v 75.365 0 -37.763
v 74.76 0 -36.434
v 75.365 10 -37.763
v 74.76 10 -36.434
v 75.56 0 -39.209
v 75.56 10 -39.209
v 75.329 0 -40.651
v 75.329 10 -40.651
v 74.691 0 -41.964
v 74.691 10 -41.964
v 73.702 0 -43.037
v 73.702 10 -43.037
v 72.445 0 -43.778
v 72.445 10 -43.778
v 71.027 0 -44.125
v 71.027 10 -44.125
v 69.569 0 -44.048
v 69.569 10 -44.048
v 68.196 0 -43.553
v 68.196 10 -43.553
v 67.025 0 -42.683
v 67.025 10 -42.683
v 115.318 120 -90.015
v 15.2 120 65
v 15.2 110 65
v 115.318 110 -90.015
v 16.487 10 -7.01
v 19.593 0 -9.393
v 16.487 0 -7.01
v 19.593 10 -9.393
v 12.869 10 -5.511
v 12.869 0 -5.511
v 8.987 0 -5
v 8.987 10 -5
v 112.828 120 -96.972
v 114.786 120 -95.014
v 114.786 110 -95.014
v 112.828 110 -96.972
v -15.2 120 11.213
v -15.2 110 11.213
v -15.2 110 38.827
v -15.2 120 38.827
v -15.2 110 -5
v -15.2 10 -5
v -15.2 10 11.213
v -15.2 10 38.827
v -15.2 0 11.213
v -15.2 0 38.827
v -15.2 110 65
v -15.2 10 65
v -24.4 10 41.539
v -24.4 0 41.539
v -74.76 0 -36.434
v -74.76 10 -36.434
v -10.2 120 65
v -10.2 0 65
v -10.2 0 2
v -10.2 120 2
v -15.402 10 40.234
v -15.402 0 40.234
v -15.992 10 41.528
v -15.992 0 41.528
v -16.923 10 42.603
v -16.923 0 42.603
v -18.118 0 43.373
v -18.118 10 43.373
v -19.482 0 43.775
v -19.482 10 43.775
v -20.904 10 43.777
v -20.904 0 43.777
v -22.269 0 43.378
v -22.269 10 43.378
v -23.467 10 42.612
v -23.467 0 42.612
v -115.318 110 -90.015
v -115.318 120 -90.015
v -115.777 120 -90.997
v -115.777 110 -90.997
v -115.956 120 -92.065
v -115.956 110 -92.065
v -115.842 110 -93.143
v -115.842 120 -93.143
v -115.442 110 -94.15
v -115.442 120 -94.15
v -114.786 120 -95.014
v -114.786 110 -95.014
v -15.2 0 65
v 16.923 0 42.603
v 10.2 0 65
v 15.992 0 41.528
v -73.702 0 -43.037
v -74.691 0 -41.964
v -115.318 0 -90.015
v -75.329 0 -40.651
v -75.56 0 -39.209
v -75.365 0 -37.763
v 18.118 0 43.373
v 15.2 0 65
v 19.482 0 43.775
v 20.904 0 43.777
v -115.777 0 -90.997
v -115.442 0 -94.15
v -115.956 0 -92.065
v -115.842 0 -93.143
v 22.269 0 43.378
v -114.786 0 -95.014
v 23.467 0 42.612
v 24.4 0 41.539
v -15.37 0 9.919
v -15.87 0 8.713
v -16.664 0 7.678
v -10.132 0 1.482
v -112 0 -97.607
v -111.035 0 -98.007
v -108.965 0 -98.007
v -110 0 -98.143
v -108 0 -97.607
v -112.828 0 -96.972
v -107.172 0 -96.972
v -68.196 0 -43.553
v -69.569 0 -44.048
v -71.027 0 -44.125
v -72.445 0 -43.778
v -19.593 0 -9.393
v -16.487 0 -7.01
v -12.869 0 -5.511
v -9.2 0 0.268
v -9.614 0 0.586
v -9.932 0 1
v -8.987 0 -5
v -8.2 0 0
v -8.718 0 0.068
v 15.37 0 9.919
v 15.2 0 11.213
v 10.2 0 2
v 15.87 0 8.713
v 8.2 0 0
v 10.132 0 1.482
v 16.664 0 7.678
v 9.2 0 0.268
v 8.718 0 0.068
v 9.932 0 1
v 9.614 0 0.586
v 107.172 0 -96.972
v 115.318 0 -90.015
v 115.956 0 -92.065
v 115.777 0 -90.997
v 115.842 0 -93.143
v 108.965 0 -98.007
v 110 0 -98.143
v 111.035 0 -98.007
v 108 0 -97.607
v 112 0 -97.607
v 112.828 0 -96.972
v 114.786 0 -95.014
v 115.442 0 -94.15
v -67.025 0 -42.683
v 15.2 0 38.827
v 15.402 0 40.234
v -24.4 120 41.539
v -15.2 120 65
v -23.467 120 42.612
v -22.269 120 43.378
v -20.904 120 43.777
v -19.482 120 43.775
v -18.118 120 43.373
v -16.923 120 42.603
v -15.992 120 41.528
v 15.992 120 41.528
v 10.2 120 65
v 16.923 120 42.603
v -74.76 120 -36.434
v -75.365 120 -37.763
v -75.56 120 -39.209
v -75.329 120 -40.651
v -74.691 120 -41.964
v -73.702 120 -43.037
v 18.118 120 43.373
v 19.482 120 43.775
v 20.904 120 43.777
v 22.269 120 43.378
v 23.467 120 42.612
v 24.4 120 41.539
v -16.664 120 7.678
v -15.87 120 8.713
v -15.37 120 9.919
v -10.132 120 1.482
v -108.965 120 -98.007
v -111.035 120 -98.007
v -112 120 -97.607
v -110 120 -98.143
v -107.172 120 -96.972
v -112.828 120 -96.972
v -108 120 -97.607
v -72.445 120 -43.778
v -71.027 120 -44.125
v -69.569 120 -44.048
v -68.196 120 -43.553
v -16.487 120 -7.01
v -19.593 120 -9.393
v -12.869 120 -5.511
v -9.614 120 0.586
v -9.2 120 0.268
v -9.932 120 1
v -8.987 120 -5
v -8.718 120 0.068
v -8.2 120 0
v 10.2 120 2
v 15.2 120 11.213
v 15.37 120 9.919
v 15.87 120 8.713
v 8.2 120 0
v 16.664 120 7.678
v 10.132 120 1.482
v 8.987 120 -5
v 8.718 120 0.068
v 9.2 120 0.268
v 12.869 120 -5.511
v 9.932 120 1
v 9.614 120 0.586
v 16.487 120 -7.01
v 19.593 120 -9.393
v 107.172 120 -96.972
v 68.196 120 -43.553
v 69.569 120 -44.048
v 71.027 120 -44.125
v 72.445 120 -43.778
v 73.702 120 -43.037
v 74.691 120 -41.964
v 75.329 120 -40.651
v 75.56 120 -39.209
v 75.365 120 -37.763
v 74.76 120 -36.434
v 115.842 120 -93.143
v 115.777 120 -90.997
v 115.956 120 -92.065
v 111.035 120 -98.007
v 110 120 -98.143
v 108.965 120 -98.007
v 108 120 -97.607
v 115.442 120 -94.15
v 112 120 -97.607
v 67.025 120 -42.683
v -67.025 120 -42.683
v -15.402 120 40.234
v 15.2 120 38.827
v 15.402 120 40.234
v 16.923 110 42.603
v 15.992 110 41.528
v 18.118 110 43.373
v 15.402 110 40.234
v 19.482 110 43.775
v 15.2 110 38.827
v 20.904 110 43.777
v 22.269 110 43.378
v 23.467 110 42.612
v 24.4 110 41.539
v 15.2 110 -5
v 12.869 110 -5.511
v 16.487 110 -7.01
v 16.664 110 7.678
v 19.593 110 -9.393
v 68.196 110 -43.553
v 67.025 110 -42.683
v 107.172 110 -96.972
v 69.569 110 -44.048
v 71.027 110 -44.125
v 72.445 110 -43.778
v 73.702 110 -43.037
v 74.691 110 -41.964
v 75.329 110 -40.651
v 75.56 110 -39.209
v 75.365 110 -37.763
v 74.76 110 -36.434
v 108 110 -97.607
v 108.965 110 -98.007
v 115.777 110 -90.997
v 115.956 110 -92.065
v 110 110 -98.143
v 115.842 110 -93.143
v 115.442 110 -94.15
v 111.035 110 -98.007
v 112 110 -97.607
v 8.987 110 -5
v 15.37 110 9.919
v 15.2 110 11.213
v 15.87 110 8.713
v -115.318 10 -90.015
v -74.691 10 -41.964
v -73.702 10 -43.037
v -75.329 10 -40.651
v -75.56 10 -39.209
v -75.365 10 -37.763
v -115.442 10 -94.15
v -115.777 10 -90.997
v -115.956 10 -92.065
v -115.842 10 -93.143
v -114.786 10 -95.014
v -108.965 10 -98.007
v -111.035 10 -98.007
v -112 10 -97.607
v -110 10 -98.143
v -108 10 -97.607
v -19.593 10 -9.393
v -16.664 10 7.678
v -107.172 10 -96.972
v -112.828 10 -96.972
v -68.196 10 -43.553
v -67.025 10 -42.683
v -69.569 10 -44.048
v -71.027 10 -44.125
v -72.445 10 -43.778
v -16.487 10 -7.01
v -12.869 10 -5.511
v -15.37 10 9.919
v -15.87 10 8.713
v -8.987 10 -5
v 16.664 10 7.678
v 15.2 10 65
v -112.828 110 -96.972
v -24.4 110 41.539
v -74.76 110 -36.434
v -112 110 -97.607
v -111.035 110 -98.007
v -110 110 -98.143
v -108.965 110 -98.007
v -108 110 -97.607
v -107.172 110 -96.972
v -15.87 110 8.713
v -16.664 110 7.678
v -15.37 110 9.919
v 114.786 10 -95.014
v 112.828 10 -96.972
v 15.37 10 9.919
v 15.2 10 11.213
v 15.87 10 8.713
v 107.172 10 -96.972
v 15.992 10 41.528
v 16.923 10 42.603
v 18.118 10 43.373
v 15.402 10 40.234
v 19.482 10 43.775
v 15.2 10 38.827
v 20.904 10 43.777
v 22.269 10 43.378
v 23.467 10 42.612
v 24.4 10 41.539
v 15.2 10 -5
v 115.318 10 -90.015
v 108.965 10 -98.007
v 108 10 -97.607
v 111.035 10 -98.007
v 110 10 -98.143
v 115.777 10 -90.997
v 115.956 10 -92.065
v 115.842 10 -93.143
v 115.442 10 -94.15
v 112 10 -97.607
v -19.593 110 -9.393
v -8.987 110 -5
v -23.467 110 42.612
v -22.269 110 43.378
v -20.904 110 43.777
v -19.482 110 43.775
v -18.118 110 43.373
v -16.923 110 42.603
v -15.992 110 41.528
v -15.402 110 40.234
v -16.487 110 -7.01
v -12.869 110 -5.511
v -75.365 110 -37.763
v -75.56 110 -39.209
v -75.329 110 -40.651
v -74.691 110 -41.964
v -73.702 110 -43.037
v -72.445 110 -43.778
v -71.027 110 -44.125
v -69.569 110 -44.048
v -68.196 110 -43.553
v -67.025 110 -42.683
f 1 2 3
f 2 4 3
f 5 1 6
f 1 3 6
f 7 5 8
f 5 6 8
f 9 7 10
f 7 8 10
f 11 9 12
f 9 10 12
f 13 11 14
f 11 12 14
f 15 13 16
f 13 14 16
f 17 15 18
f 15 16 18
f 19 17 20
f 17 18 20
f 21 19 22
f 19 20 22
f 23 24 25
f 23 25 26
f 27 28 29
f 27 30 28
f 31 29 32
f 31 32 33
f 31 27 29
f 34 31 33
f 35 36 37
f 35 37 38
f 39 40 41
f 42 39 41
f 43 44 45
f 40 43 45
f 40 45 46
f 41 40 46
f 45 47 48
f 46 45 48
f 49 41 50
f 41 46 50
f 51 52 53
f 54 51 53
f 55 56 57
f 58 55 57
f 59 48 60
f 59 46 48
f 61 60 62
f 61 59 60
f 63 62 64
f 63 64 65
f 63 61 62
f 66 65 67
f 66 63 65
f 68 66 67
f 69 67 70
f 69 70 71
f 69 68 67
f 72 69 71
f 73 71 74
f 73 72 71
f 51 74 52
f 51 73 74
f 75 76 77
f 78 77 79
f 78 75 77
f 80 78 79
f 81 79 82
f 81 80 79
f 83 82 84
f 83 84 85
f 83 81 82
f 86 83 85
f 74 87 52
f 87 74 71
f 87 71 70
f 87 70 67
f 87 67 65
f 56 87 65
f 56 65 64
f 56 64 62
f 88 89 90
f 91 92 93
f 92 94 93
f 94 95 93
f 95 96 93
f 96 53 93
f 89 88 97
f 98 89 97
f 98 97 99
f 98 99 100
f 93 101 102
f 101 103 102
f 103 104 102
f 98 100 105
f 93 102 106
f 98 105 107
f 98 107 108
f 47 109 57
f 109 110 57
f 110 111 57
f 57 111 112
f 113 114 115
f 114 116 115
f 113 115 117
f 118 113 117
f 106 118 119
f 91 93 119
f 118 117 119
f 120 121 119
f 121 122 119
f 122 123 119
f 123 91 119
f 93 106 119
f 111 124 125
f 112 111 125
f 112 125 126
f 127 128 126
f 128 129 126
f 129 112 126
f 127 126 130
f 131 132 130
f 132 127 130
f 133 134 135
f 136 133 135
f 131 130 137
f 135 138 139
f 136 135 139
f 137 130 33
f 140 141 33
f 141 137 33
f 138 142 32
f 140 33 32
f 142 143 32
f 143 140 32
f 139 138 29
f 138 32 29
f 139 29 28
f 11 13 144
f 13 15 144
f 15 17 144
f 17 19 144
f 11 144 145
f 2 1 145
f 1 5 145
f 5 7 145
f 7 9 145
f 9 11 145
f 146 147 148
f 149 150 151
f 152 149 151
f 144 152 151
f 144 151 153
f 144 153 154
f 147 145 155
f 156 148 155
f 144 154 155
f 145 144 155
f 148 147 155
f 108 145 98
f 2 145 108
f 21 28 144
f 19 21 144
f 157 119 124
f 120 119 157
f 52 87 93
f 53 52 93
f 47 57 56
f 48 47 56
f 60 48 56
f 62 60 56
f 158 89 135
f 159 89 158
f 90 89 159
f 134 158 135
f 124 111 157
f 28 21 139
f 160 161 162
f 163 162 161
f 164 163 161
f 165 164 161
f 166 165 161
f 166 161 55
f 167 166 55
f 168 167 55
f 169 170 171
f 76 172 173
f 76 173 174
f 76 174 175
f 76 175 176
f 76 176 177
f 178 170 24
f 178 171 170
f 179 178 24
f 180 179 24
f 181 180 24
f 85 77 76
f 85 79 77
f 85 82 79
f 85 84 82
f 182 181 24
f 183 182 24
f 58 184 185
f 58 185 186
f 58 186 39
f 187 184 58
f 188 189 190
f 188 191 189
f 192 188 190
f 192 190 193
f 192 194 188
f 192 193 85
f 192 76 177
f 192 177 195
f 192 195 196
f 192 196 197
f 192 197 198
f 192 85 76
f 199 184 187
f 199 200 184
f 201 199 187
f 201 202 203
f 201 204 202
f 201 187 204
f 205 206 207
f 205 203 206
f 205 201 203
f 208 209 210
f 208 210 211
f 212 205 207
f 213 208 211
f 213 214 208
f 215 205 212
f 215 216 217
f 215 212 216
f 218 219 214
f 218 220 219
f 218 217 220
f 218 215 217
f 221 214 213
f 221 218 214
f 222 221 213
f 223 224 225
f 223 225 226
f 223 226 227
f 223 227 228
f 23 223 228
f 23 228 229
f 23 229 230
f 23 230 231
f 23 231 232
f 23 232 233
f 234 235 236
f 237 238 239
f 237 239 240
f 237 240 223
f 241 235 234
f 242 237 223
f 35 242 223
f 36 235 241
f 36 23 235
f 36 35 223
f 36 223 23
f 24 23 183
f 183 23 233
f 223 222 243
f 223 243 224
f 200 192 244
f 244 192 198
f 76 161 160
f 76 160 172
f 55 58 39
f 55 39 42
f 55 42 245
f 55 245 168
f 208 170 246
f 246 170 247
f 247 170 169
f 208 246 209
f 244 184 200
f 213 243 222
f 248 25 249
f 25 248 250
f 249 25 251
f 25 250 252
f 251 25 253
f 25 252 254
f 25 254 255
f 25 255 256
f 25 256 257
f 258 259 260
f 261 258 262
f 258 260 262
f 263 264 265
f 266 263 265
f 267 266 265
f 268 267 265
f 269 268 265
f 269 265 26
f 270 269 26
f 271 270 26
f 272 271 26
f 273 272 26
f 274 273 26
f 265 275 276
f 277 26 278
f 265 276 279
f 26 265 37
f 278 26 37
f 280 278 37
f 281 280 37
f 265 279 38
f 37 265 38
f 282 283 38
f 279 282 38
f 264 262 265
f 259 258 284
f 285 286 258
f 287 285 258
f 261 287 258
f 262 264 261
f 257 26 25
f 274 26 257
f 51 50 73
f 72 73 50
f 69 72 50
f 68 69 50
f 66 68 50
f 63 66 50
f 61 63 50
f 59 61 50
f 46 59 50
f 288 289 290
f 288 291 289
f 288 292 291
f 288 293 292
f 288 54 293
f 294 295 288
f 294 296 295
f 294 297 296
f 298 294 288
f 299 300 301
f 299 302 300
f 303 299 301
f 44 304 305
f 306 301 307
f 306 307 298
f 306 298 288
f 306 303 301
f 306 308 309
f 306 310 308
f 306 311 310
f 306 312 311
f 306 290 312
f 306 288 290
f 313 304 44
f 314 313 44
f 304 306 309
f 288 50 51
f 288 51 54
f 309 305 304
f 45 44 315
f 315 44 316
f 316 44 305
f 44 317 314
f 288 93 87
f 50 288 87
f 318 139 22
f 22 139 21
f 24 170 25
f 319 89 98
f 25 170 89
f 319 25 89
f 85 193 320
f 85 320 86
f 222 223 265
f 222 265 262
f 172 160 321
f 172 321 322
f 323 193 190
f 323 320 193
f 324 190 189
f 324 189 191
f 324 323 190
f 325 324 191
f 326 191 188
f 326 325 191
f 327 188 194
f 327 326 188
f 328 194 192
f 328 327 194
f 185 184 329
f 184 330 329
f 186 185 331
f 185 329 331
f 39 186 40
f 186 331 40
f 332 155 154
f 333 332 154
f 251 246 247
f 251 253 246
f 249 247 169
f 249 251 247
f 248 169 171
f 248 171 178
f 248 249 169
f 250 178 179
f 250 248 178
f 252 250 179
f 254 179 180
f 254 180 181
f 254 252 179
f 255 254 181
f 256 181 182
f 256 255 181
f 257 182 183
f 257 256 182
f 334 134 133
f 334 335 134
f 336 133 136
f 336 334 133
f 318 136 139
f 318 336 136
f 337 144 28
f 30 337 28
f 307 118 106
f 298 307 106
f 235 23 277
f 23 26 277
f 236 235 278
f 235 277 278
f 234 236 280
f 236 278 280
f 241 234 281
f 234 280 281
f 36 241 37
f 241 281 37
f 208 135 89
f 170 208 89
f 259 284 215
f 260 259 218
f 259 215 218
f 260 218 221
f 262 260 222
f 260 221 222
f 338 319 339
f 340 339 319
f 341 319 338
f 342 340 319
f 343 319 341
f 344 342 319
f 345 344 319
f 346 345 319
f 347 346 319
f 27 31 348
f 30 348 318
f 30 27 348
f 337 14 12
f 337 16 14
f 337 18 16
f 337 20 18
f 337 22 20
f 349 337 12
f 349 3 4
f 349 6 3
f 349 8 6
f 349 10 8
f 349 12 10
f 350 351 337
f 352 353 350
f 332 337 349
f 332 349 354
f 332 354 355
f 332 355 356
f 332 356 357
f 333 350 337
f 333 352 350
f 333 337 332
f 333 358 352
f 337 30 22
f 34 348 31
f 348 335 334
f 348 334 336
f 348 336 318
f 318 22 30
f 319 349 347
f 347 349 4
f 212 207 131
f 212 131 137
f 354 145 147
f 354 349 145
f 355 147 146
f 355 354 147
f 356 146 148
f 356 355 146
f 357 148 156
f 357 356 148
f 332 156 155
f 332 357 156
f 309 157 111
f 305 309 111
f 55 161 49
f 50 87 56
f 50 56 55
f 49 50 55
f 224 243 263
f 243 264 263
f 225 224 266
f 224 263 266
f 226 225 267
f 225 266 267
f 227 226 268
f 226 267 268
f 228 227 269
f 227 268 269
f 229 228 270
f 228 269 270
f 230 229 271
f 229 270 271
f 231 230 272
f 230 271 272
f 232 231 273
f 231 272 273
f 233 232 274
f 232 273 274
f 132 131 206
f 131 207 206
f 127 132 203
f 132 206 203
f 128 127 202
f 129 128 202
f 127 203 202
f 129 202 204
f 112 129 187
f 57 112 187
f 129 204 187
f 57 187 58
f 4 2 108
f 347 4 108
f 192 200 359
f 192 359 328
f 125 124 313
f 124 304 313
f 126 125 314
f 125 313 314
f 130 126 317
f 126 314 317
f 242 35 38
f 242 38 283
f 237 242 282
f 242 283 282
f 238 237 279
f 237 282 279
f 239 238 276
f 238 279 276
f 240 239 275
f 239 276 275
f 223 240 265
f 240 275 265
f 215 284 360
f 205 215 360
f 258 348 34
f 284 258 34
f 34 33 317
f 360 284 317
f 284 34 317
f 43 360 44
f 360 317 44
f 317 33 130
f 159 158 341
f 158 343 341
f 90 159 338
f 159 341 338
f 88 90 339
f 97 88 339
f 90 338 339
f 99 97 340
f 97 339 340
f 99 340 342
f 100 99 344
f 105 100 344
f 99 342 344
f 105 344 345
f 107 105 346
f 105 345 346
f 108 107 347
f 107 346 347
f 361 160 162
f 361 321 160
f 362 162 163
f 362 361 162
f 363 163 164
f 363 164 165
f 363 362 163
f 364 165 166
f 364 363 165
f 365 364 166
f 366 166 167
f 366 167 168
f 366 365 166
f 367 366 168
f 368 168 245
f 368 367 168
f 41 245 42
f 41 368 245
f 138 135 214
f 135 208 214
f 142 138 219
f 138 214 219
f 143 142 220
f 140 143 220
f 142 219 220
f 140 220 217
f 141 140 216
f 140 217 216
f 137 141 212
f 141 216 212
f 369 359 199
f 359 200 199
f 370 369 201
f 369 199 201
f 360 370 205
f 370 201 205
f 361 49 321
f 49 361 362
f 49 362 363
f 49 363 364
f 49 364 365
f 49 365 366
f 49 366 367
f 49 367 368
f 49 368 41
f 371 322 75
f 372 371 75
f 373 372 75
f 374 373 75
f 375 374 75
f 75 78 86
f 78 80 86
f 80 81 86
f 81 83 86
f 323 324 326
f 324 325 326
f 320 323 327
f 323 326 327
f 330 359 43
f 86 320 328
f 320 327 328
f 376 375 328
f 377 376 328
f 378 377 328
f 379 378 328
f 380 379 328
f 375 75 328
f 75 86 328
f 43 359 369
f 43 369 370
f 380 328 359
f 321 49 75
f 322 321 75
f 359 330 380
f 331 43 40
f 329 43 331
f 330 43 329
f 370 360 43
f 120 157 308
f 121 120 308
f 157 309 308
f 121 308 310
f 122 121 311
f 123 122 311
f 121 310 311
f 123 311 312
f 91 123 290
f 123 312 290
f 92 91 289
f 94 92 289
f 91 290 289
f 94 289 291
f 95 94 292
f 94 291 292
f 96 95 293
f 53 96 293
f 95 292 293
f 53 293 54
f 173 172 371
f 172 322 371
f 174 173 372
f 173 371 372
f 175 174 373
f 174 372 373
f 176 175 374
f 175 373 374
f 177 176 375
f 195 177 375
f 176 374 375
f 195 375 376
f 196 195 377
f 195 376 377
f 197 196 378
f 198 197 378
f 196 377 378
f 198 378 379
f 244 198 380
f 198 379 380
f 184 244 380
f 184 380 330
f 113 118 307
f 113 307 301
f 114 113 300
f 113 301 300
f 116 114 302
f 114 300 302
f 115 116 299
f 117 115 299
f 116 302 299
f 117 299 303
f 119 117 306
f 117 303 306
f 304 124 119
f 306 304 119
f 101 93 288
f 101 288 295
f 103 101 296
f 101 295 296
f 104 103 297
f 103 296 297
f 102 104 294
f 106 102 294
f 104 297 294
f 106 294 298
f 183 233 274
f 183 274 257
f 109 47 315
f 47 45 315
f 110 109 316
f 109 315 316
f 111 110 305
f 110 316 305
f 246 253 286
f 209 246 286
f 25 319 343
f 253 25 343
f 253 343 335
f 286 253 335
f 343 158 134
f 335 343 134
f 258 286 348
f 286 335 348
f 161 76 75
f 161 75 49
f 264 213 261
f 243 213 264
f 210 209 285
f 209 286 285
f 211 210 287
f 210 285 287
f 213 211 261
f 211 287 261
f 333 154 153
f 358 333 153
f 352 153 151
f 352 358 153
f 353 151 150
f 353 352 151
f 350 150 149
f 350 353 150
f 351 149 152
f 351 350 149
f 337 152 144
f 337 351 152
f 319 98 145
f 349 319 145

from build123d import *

# Parameters (mm, degrees)
BOSS_EXTRUDE1_DEPTH = 120
BOSS_EXTRUDE2_DEPTH = 10
BOSS_EXTRUDE3_START = 120
BOSS_EXTRUDE3_DEPTH = 10
FILLET1_R           = 5
FILLET2_R           = 15
FILLET3_R           = 2
FILLET4_R           = 4


with BuildPart() as part:
    # Sketch1 → Boss-Extrude1 (new body)
    with BuildSketch(Plane(origin=(0, 0, 0), x_dir=(1, 0, 0), z_dir=(0, 1, 0))):
        Polygon((-15.2, -55.784127273), (-15.2, -65), (-10.2, -65), (-10.2, -20.4), (-10.2, 0), (10.2, 0), (10.2, -20.4), (10.2, -65), (15.2, -65), (15.2, -55.784127273), (15.2, -9.142135624), (15.2, 5), (-15.2, 5), (-15.2, -9.142135624), align=None)
    extrude(amount=BOSS_EXTRUDE1_DEPTH)

    # Sketch1<3> → Boss-Extrude2 (add)
    with BuildSketch(Plane(origin=(0, 0, 0), x_dir=(1, 0, 0), z_dir=(0, 1, 0))):
        Polygon((-110, 99.8), (-117.071067812, 92.728932188), (-100.263572466, 75.921436842), (-15.2, -9.142135624), (-15.2, 5), align=None)
        Polygon((110, 99.8), (15.2, 5), (15.2, -9.142135624), (100.263572466, 75.921436842), (117.071067812, 92.728932188), align=None)
        Polygon((100.263572466, 75.921436842), (15.2, -55.784127273), (15.2, -65), (117.071067812, 92.728932188), align=None)
        Polygon((-100.263572466, 75.921436842), (-117.071067812, 92.728932188), (-15.2, -65), (-15.2, -55.784127273), align=None)
    extrude(amount=BOSS_EXTRUDE2_DEPTH)

    # Sketch1<4> → Boss-Extrude3 (add)
    with BuildSketch(Plane(origin=(0, 0, 0), x_dir=(1, 0, 0), z_dir=(0, 1, 0)).offset(BOSS_EXTRUDE3_START)):
        Polygon((-110, 99.8), (-117.071067812, 92.728932188), (-100.263572466, 75.921436842), (-15.2, -9.142135624), (-15.2, 5), align=None)
        Polygon((-100.263572466, 75.921436842), (-117.071067812, 92.728932188), (-15.2, -65), (-15.2, -55.784127273), align=None)
        Polygon((110, 99.8), (15.2, 5), (15.2, -9.142135624), (100.263572466, 75.921436842), (117.071067812, 92.728932188), align=None)
        Polygon((100.263572466, 75.921436842), (15.2, -55.784127273), (15.2, -65), (117.071067812, 92.728932188), align=None)
    extrude(amount=-BOSS_EXTRUDE3_DEPTH)

    # Fillet1
    fillet1_edges = [part.edges().sort_by_distance(p)[0] for p in [
        (15.2, 5, 9.142135624),
        (100.263572466, 5, -75.921436842),
        (15.2, 5, 55.784127273),
        (-15.2, 5, 55.784127273),
        (-100.263572466, 5, -75.921436842),
        (-15.2, 5, 9.142135624),
        (-100.263572466, 115, -75.921436842),
        (-15.2, 115, 55.784127273),
        (-15.2, 115, 9.142135624),
        (15.2, 115, 55.784127273),
        (100.263572466, 115, -75.921436842),
        (15.2, 115, 9.142135624),
    ]]
    fillet(fillet1_edges, radius=FILLET1_R)

    # Fillet2
    fillet2_edges = [part.edges().sort_by_distance(p)[0] for p in [
        (-15.2, 115, -5),
        (15.2, 115, -5),
        (15.2, 5, -5),
        (-15.2, 5, -5),
    ]]
    fillet(fillet2_edges, radius=FILLET2_R)

    # Fillet3
    fillet3_edges = [part.edges().sort_by_distance(p)[0] for p in [
        (10.2, 60, 0),
        (-10.2, 60, 0),
    ]]
    fillet(fillet3_edges, radius=FILLET3_R)

    # Fillet4
    fillet4_edges = [part.edges().sort_by_distance(p)[0] for p in [
        (117.071067812, 5, -92.728932188),
        (110, 5, -99.8),
        (-110, 5, -99.8),
        (-117.071067812, 5, -92.728932188),
        (-117.071067812, 115, -92.728932188),
        (-110, 115, -99.8),
        (110, 115, -99.8),
        (117.071067812, 115, -92.728932188),
    ]]
    fillet(fillet4_edges, radius=FILLET4_R)


solid = part.part
